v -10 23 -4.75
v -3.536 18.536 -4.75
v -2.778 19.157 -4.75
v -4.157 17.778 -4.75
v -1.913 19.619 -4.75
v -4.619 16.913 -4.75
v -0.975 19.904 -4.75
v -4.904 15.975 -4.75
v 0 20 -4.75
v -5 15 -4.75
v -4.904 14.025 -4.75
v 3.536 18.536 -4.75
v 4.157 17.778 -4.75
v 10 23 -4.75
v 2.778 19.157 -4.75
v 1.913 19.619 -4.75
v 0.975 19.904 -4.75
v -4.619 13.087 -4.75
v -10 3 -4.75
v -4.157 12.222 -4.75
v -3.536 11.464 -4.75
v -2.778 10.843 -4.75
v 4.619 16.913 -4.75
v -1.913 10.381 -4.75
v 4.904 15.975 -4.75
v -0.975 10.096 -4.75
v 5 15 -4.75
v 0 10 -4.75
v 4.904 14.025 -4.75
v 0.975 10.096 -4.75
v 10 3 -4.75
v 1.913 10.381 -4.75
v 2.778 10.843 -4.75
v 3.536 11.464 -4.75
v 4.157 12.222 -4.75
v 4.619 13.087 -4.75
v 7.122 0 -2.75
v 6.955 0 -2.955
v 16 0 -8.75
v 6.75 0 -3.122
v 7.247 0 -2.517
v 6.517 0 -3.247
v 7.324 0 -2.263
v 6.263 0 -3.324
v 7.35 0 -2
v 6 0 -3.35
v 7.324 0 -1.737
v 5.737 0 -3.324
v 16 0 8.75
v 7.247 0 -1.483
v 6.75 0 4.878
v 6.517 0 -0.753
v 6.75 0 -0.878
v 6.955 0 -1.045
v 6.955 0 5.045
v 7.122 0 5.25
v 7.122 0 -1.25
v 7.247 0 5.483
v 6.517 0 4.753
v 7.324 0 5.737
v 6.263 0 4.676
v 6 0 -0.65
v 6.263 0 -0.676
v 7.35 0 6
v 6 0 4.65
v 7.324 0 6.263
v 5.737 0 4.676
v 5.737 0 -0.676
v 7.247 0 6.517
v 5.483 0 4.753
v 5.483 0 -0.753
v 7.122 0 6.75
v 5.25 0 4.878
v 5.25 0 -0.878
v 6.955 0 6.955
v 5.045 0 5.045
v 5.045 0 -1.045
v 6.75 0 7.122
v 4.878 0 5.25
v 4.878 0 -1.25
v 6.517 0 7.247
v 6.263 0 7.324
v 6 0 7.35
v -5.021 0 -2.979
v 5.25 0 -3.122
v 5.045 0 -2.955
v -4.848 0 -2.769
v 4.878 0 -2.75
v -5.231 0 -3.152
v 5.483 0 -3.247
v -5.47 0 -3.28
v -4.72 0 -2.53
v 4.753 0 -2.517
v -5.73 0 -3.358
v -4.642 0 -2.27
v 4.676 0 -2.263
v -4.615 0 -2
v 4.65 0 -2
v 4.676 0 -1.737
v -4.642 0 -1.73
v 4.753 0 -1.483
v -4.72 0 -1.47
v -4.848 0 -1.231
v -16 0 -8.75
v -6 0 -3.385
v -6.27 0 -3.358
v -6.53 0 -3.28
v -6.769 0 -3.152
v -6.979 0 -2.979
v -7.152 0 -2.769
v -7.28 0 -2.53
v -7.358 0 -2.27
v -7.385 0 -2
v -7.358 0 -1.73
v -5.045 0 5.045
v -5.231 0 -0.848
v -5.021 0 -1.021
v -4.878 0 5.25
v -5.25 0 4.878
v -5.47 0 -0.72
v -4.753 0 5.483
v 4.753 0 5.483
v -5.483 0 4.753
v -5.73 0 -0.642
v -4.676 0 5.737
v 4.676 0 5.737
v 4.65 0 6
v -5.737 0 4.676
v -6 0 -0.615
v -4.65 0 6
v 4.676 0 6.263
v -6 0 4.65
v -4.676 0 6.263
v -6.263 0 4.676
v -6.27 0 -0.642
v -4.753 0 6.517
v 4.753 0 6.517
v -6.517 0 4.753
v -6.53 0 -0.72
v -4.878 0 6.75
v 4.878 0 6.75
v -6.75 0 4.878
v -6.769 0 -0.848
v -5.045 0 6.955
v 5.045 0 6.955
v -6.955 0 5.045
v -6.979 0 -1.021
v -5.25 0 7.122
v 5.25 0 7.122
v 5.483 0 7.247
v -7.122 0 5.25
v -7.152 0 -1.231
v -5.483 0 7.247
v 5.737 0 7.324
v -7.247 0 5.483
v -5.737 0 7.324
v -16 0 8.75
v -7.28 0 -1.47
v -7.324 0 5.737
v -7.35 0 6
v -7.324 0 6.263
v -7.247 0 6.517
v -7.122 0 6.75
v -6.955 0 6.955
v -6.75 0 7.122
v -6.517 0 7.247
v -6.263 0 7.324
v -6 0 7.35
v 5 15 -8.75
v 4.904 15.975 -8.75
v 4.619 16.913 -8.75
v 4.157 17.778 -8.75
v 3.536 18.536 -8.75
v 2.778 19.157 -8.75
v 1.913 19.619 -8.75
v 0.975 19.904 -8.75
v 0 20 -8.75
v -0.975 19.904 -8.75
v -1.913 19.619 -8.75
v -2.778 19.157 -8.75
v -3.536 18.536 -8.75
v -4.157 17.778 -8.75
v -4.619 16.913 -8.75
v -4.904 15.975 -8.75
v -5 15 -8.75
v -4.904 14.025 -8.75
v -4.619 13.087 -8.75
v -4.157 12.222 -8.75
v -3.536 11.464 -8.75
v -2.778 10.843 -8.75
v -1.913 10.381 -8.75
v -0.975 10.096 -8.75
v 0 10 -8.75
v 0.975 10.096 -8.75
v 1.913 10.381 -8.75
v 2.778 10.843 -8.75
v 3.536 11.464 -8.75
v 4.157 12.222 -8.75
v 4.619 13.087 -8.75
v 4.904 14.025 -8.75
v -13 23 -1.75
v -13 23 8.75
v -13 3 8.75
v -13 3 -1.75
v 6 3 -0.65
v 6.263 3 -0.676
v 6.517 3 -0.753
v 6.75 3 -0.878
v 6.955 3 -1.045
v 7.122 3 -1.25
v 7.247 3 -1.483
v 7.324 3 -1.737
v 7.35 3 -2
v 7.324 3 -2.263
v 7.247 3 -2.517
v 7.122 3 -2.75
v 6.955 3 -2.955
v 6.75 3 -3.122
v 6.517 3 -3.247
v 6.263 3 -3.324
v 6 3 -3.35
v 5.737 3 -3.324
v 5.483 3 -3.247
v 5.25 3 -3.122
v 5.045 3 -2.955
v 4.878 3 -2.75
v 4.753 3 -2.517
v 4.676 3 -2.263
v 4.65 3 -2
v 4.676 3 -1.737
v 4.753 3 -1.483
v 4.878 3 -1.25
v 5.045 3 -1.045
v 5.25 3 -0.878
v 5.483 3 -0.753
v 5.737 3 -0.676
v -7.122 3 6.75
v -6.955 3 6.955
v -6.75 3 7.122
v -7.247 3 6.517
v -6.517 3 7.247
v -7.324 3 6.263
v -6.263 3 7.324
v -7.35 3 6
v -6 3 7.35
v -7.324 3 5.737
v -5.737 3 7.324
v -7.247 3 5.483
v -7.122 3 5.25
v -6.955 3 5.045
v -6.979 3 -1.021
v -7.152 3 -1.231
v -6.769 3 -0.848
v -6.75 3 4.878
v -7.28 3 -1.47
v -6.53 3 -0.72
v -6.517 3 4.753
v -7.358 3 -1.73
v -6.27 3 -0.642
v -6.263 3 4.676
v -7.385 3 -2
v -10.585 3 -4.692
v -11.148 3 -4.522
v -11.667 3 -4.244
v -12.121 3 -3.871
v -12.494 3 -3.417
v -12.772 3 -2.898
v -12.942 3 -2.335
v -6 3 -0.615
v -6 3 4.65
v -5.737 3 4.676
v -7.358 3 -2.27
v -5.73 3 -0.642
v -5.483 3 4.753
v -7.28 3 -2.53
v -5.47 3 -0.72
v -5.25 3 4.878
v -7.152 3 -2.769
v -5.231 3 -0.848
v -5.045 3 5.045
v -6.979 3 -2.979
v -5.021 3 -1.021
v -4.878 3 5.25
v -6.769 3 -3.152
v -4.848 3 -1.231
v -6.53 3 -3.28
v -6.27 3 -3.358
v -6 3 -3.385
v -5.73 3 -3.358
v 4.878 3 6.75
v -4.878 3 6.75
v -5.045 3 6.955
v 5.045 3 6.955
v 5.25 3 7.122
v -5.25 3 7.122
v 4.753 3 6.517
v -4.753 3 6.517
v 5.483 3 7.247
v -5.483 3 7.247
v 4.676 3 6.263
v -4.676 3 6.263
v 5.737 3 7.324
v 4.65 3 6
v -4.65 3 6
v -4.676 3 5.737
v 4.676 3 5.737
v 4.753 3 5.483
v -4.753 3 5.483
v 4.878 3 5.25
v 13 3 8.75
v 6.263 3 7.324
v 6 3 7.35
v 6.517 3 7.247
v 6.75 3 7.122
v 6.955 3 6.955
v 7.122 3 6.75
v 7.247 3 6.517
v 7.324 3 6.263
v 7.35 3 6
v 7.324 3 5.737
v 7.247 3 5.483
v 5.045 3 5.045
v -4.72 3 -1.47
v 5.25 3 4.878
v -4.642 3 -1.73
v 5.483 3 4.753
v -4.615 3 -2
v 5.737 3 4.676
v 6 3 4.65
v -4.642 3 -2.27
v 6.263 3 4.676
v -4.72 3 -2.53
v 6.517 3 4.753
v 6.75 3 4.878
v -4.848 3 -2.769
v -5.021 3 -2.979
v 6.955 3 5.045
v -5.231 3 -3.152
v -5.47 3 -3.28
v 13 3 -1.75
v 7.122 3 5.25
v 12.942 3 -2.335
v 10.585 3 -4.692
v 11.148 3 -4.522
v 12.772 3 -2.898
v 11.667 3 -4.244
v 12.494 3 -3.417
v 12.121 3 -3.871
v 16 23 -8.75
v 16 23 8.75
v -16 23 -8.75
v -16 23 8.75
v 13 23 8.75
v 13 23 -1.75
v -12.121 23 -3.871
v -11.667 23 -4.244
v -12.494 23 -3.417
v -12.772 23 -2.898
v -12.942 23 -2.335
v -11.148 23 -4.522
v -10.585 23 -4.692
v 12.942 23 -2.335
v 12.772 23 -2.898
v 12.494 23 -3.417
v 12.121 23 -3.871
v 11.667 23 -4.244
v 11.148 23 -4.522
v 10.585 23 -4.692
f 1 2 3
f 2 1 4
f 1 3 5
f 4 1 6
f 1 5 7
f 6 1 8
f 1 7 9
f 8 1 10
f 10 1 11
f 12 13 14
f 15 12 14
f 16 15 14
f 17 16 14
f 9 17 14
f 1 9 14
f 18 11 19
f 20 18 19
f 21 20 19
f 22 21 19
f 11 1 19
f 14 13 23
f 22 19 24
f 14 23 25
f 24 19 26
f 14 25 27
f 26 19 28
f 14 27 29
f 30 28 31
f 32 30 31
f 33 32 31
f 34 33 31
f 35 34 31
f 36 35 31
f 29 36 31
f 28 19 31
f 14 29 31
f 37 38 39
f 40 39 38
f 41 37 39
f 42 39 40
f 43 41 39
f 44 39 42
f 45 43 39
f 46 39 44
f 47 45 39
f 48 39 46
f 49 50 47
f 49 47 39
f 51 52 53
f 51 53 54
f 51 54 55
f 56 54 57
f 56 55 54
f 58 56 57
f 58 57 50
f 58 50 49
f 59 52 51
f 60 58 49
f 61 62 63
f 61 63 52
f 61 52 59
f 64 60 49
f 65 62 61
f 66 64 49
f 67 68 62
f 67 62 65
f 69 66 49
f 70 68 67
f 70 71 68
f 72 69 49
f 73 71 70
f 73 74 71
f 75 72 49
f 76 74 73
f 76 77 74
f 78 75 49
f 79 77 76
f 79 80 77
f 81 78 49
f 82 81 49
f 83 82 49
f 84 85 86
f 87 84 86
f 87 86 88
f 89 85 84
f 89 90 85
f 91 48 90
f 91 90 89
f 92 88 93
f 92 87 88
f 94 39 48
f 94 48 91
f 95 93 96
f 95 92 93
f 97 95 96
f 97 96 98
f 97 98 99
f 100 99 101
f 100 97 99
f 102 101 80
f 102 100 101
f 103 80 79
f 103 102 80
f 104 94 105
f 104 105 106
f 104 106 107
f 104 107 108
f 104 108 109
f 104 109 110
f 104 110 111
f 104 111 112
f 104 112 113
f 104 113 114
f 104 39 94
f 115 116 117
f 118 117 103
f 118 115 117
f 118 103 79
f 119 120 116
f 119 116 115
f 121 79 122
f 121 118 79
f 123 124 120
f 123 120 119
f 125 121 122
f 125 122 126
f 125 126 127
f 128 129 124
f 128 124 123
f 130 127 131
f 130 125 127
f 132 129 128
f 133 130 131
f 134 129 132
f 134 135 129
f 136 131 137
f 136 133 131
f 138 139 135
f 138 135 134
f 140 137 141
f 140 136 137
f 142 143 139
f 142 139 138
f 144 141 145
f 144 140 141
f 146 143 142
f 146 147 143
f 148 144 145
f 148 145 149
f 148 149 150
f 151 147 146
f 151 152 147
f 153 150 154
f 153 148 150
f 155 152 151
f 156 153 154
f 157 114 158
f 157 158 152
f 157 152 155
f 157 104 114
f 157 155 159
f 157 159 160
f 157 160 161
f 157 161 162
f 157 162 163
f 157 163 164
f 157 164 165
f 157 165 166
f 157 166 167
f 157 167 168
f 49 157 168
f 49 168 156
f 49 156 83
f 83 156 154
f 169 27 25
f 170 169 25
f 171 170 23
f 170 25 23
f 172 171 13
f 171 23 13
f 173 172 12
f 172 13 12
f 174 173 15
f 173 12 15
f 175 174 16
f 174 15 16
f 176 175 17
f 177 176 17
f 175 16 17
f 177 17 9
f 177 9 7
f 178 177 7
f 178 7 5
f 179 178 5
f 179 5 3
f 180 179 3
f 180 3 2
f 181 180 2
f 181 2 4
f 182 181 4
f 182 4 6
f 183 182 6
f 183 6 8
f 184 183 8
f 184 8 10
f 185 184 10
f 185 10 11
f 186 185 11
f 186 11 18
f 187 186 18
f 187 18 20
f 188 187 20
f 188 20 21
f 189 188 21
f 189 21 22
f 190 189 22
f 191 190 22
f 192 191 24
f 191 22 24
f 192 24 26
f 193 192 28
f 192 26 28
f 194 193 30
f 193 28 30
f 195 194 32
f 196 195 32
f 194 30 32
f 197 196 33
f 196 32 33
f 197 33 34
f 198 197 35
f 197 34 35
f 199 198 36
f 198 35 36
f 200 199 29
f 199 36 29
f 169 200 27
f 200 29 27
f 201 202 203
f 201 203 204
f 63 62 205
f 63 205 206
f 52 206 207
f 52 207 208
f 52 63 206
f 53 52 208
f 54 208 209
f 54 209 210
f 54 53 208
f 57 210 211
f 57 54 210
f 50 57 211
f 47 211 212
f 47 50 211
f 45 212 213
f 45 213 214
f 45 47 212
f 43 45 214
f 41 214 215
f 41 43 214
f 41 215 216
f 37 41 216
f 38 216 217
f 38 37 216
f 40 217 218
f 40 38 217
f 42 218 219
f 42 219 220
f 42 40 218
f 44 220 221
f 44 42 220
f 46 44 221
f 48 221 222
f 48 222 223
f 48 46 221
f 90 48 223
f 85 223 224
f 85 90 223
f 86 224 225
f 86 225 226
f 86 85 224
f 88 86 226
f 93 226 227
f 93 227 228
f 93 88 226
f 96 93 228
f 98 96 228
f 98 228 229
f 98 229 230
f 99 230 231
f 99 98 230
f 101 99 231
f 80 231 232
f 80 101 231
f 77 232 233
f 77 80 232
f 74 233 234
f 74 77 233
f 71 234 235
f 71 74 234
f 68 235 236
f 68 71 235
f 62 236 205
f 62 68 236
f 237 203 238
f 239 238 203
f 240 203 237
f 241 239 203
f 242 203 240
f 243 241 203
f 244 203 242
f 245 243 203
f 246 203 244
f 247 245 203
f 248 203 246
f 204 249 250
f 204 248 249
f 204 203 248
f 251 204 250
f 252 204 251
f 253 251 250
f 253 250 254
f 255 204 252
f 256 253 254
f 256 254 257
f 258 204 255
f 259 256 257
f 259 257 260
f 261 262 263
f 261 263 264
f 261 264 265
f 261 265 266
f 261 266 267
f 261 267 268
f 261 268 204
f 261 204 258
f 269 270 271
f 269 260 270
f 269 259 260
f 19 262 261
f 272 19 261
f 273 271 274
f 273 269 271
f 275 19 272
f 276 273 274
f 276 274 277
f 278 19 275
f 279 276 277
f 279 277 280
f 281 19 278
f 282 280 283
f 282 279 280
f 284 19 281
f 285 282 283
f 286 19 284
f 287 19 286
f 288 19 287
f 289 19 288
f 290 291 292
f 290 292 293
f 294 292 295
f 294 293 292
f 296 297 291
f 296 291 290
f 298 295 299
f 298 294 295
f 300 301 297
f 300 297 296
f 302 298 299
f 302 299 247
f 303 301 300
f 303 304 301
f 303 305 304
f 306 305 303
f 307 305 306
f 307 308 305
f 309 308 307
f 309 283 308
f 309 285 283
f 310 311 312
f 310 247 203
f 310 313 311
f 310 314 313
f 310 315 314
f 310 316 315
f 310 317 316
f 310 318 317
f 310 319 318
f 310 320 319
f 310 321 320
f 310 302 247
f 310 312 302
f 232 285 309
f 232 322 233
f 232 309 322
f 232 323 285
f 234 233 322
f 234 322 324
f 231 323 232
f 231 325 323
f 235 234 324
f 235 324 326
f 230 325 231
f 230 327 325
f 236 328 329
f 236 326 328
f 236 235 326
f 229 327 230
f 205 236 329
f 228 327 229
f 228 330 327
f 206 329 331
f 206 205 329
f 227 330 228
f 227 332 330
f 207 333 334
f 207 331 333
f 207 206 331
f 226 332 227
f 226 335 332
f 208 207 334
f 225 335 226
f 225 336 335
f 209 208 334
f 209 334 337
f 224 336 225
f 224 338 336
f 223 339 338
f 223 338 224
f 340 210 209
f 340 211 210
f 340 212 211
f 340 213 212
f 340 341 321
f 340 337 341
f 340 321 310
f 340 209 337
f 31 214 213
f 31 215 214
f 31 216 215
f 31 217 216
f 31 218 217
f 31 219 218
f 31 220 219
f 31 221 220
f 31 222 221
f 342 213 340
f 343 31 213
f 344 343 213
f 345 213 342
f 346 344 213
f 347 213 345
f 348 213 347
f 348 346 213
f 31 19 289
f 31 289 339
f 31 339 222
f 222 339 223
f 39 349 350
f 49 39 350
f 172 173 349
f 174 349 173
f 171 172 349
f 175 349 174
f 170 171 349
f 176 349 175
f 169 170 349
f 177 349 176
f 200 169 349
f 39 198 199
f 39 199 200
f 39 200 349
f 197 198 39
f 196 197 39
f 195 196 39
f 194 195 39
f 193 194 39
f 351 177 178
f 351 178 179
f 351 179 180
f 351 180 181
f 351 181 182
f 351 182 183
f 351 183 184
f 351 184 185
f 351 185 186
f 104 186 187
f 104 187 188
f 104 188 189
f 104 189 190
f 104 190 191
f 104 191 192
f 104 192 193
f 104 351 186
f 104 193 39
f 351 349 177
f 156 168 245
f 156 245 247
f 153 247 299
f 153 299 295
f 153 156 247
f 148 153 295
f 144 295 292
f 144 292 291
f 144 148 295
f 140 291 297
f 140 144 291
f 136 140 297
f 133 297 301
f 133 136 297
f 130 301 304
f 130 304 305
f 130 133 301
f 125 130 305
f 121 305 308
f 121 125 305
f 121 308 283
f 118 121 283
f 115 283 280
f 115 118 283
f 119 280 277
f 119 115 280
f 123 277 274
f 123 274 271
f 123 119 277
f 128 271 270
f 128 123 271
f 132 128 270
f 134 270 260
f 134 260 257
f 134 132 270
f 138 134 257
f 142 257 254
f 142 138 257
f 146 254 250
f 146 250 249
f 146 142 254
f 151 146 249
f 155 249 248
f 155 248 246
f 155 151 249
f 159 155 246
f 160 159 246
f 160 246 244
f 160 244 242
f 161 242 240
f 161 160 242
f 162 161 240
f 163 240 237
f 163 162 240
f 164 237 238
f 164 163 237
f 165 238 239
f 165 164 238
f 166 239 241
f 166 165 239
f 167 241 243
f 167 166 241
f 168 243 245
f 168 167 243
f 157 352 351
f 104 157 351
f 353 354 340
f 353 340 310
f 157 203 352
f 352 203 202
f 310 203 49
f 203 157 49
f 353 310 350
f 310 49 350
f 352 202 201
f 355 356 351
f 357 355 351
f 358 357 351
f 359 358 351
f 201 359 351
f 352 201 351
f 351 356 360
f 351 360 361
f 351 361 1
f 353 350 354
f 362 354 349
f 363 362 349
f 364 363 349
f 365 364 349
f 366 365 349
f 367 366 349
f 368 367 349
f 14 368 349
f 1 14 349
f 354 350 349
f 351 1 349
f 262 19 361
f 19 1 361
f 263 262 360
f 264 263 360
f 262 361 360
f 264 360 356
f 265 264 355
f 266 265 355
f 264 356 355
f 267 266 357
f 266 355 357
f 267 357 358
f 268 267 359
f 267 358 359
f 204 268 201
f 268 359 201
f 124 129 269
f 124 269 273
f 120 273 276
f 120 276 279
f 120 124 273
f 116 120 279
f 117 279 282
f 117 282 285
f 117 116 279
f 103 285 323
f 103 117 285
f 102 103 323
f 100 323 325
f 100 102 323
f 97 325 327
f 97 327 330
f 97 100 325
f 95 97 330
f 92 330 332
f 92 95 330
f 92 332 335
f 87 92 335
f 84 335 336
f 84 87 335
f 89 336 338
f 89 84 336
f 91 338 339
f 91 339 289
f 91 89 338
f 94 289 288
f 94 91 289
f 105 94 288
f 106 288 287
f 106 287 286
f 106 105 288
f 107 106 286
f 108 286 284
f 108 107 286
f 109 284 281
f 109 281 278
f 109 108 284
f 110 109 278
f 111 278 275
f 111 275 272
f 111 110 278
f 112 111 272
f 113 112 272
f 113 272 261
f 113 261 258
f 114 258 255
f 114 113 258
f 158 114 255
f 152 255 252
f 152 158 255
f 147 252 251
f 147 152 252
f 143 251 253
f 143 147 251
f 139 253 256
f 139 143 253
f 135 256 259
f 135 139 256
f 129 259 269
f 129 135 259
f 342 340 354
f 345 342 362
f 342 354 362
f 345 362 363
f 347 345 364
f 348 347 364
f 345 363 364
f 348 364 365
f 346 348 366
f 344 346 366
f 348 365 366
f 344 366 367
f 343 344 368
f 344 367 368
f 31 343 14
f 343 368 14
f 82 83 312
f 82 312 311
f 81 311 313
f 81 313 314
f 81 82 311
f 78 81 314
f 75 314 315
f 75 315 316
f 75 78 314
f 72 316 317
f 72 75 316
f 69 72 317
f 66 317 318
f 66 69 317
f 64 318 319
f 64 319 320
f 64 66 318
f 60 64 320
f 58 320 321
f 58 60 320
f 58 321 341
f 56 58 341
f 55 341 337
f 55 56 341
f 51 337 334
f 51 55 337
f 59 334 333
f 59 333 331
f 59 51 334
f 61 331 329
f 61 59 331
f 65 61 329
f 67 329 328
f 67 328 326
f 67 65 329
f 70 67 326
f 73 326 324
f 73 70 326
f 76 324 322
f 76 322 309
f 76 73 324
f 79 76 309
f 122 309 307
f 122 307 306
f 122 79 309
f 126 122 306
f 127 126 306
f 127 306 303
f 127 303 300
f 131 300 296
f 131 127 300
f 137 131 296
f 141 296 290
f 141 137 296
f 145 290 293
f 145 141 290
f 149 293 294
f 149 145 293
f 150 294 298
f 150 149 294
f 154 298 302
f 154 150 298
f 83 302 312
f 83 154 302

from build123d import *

# Parameters (mm, degrees)
SKETCH_1_W          = 26
SKETCH_1_H          = 17.5
SKETCH_1_R          = 1.385
SKETCH_1_R_2        = 1.35
EXTRUDE_1_DEPTH     = 3
SKETCH_2_W          = 26
SKETCH_2_H          = 4
EXTRUDE_2_DEPTH     = 20
SKETCH_3_R          = 5
CUT_EXTRUDE_1_DEPTH = 20
EXTRUDE_3_DEPTH     = 3
EXTRUDE_4_DEPTH     = 3
EXTRUDE_5_DEPTH     = 3
EXTRUDE_6_DEPTH     = 3
FILLET_1_R          = 3


with BuildPart() as part:
    # 草图1 → 凸台-拉伸1 (new body)
    with BuildSketch(Plane(origin=(0, 0, 0), x_dir=(1, 0, 0), z_dir=(0, 1, 0))):
        Rectangle(SKETCH_1_W, SKETCH_1_H)
        with Locations((-6, 2)):
            Circle(SKETCH_1_R, mode=Mode.SUBTRACT)
        with Locations((-6, -6)):
            Circle(SKETCH_1_R_2, mode=Mode.SUBTRACT)
        with Locations((6, 2)):
            Circle(SKETCH_1_R_2, mode=Mode.SUBTRACT)
        with Locations((6, -6)):
            Circle(SKETCH_1_R_2, mode=Mode.SUBTRACT)
    extrude(amount=EXTRUDE_1_DEPTH)

    # 草图2 → 凸台-拉伸2 (add)
    with BuildSketch(Plane(origin=(0, 3, 0), x_dir=(1, 0, 0), z_dir=(0, 1, 0))):
        with Locations((0, 6.75)):
            Rectangle(SKETCH_2_W, SKETCH_2_H)
    extrude(amount=EXTRUDE_2_DEPTH)

    # 草图3 → 切除-拉伸1 (cut)
    with BuildSketch(Plane.XY.offset(-4.75)):
        with Locations((0, 15)):
            Circle(SKETCH_3_R)
    extrude(amount=-CUT_EXTRUDE_1_DEPTH, mode=Mode.SUBTRACT)

    # 草图4 → 凸台-拉伸3 (add)
    with BuildSketch(Plane.ZY.offset(13)):
        Polygon((-8.75, 23), (-8.75, 0), (8.75, 0), (8.75, 3), (-4.75, 23), align=None)
    extrude(amount=EXTRUDE_3_DEPTH)

    # 草图5 → 凸台-拉伸4 (add)
    with BuildSketch(Plane(origin=(13, 0, 0), x_dir=(0, 0, -1), z_dir=(1, 0, 0))):
        Polygon((8.75, 0), (-8.75, 0), (-8.75, 3), (4.75, 23), (8.75, 23), align=None)
    extrude(amount=EXTRUDE_4_DEPTH)

    # 草图6 → 凸台-拉伸5 (add)
    with BuildSketch(Plane.ZY.offset(16)):
        Polygon((-4.75, 23), (8.75, 23), (8.75, 3), align=None)
    extrude(amount=-EXTRUDE_5_DEPTH)

    # 草图8 → 凸台-拉伸6 (add)
    with BuildSketch(Plane(origin=(16, 0, 0), x_dir=(0, 0, -1), z_dir=(1, 0, 0))):
        Polygon((-8.75, 3), (-8.75, 23), (4.75, 23), align=None)
    extrude(amount=-EXTRUDE_6_DEPTH)

    # 圆角1
    fillet_1_edges = [part.edges().sort_by_distance(p)[0] for p in [
        (-13, 13, -4.75),
        (13, 13, -4.75),
    ]]
    fillet(fillet_1_edges, radius=FILLET_1_R)


solid = part.part
